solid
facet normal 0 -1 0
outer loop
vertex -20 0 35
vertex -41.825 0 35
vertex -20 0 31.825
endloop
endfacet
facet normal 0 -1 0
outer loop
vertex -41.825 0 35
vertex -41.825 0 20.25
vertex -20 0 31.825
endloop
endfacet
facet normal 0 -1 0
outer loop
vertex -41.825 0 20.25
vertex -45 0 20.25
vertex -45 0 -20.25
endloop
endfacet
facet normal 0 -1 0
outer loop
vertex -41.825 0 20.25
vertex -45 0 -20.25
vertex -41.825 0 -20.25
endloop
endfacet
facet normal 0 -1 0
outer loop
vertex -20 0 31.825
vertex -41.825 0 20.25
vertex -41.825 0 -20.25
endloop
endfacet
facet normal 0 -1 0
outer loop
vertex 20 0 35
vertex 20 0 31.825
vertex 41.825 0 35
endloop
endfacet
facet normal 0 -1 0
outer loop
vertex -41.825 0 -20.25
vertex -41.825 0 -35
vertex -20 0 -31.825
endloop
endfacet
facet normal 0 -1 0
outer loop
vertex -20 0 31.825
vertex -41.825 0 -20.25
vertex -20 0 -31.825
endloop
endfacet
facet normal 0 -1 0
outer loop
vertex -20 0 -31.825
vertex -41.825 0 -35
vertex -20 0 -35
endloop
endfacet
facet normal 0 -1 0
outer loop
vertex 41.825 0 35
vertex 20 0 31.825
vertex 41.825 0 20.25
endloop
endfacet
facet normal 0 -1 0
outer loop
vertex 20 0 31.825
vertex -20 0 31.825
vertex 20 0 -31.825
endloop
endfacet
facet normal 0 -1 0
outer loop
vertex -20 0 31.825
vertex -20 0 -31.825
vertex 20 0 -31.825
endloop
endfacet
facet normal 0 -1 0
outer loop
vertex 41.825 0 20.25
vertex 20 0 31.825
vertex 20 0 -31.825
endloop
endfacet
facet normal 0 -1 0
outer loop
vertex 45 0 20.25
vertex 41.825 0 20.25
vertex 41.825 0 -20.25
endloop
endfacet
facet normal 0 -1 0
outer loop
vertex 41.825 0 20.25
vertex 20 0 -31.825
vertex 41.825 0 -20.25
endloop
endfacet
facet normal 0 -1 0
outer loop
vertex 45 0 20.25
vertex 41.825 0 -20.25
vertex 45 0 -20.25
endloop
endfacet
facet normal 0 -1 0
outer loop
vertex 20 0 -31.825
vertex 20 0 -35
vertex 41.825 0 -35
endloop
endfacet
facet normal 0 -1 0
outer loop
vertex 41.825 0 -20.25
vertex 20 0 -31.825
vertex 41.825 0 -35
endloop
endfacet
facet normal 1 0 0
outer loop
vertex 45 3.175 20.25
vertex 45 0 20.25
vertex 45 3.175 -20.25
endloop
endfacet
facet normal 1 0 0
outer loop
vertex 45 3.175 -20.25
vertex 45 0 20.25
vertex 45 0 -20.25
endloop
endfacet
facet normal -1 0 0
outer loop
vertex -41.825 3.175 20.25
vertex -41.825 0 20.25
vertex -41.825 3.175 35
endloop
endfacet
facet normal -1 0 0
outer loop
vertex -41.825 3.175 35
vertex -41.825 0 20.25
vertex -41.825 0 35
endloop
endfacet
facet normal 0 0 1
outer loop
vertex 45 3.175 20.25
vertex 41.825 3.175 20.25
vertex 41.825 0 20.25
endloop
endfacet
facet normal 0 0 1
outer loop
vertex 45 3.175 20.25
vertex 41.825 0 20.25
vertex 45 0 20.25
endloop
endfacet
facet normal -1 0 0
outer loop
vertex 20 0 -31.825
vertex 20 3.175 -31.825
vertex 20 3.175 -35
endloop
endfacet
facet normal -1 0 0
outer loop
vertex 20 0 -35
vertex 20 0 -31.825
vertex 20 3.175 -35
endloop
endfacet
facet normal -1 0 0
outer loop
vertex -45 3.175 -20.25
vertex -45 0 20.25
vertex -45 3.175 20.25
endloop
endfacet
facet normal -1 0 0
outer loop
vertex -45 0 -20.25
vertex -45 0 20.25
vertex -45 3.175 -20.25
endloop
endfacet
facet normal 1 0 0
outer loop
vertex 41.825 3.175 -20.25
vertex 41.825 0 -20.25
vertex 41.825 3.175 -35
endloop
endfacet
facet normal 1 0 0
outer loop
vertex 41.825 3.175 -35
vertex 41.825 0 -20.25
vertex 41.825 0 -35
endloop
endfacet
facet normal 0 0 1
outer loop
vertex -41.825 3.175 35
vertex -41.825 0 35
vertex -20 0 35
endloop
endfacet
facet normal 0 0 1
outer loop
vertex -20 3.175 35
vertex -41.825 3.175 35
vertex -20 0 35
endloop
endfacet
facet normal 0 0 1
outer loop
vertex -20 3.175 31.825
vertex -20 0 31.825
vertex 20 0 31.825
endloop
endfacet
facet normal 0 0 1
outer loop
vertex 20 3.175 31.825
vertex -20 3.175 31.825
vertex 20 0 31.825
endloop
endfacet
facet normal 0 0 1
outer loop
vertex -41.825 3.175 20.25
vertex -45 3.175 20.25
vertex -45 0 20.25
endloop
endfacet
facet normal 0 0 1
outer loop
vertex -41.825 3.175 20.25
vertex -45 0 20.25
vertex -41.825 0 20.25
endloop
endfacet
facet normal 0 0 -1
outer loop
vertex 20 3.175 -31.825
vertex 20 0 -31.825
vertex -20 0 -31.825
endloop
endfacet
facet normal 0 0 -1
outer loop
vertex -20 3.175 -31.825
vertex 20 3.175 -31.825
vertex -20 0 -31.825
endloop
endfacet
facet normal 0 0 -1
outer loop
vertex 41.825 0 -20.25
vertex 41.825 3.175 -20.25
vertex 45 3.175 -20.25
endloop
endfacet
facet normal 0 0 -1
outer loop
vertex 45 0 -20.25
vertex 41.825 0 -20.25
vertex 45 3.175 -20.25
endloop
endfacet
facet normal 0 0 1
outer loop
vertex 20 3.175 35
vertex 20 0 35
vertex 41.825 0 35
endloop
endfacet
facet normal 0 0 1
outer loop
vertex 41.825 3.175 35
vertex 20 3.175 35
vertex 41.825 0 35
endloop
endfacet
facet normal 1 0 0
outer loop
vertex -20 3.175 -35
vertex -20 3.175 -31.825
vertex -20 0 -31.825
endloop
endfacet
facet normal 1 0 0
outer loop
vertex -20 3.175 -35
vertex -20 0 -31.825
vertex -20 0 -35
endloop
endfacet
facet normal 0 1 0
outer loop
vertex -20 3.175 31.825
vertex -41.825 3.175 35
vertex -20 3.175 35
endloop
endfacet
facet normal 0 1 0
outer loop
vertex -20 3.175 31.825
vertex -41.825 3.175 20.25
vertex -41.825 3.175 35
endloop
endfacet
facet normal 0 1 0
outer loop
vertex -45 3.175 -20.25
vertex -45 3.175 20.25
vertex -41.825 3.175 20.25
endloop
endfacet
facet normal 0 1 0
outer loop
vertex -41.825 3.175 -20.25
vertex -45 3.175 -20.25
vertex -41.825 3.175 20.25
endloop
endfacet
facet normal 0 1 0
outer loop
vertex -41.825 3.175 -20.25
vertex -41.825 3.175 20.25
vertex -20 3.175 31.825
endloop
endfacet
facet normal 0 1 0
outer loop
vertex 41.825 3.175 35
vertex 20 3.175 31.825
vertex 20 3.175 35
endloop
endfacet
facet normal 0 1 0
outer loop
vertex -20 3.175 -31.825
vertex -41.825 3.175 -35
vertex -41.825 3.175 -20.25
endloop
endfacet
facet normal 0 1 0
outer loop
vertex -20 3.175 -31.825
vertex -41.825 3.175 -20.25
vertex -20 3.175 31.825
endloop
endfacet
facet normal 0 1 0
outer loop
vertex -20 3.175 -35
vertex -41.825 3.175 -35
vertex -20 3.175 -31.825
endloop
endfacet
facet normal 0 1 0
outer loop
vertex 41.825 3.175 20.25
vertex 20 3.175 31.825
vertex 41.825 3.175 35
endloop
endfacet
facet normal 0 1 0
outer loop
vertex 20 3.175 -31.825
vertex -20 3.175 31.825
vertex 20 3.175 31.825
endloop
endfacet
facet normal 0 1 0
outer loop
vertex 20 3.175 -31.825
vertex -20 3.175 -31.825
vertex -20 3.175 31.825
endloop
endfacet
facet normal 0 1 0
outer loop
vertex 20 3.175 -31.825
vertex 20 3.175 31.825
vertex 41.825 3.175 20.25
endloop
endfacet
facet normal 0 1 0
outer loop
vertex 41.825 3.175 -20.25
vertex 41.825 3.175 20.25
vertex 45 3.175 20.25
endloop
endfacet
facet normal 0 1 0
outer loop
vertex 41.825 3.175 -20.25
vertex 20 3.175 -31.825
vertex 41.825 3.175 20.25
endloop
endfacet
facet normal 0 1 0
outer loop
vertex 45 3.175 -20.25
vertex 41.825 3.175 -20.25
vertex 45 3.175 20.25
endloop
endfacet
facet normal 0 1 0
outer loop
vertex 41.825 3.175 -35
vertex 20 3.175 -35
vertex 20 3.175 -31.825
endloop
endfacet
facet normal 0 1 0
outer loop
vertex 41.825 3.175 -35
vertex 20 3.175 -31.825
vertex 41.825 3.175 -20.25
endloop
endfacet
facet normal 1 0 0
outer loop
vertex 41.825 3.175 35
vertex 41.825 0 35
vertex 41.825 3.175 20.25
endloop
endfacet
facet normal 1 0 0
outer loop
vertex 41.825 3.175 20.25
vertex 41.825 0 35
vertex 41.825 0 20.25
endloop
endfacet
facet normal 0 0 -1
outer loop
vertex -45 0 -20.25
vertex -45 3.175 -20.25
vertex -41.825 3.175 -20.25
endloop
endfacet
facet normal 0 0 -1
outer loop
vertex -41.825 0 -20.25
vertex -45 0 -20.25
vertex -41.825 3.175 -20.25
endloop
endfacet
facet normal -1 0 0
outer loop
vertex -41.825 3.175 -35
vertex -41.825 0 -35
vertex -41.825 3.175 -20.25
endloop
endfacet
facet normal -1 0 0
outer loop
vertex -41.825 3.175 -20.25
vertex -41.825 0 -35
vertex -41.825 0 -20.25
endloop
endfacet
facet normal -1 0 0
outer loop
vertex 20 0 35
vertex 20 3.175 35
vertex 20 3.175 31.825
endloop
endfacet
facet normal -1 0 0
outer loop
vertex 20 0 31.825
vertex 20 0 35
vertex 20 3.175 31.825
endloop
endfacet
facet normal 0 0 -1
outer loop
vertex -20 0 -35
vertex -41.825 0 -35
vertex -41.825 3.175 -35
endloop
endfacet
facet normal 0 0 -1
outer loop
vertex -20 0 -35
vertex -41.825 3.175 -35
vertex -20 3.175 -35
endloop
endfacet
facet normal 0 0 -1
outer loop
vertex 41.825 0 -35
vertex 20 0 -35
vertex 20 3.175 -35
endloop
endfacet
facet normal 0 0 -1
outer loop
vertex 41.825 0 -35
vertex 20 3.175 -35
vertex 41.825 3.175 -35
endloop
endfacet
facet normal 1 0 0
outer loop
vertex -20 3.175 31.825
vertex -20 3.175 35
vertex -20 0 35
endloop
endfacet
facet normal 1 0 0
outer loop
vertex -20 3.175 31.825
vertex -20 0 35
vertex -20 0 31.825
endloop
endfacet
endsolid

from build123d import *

# Parameters (mm, degrees)
SKETCH1_W           = 21.825
SKETCH1_H           = 3.175
SKETCH1_W_2         = 3.175
SKETCH1_H_2         = 40.5
BOSS_EXTRUDE1_DEPTH = 3.175


with BuildPart() as part:
    # Sketch1 → Boss-Extrude1 (new body)
    with BuildSketch(Plane(origin=(0, 0, 0), x_dir=(1, 0, 0), z_dir=(0, 1, 0))):
        Polygon((-20, 31.825), (-41.825, 31.825), (-41.825, 20.25), (-41.825, -20.25), (-41.825, -31.825), (-20, -31.825), (20, -31.825), (41.825, -31.825), (41.825, -20.25), (41.825, 20.25), (41.825, 31.825), (20, 31.825), align=None)
        with Locations((-30.9125, -33.4125)):
            Rectangle(SKETCH1_W, SKETCH1_H)
        with Locations((30.9125, -33.4125)):
            Rectangle(SKETCH1_W, SKETCH1_H)
        with Locations((43.4125, 0)):
            Rectangle(SKETCH1_W_2, SKETCH1_H_2)
        with Locations((30.9125, 33.4125)):
            Rectangle(SKETCH1_W, SKETCH1_H)
        with Locations((-30.9125, 33.4125)):
            Rectangle(SKETCH1_W, SKETCH1_H)
        with Locations((-43.4125, 0)):
            Rectangle(SKETCH1_W_2, SKETCH1_H_2)
    extrude(amount=BOSS_EXTRUDE1_DEPTH)


solid = part.part
